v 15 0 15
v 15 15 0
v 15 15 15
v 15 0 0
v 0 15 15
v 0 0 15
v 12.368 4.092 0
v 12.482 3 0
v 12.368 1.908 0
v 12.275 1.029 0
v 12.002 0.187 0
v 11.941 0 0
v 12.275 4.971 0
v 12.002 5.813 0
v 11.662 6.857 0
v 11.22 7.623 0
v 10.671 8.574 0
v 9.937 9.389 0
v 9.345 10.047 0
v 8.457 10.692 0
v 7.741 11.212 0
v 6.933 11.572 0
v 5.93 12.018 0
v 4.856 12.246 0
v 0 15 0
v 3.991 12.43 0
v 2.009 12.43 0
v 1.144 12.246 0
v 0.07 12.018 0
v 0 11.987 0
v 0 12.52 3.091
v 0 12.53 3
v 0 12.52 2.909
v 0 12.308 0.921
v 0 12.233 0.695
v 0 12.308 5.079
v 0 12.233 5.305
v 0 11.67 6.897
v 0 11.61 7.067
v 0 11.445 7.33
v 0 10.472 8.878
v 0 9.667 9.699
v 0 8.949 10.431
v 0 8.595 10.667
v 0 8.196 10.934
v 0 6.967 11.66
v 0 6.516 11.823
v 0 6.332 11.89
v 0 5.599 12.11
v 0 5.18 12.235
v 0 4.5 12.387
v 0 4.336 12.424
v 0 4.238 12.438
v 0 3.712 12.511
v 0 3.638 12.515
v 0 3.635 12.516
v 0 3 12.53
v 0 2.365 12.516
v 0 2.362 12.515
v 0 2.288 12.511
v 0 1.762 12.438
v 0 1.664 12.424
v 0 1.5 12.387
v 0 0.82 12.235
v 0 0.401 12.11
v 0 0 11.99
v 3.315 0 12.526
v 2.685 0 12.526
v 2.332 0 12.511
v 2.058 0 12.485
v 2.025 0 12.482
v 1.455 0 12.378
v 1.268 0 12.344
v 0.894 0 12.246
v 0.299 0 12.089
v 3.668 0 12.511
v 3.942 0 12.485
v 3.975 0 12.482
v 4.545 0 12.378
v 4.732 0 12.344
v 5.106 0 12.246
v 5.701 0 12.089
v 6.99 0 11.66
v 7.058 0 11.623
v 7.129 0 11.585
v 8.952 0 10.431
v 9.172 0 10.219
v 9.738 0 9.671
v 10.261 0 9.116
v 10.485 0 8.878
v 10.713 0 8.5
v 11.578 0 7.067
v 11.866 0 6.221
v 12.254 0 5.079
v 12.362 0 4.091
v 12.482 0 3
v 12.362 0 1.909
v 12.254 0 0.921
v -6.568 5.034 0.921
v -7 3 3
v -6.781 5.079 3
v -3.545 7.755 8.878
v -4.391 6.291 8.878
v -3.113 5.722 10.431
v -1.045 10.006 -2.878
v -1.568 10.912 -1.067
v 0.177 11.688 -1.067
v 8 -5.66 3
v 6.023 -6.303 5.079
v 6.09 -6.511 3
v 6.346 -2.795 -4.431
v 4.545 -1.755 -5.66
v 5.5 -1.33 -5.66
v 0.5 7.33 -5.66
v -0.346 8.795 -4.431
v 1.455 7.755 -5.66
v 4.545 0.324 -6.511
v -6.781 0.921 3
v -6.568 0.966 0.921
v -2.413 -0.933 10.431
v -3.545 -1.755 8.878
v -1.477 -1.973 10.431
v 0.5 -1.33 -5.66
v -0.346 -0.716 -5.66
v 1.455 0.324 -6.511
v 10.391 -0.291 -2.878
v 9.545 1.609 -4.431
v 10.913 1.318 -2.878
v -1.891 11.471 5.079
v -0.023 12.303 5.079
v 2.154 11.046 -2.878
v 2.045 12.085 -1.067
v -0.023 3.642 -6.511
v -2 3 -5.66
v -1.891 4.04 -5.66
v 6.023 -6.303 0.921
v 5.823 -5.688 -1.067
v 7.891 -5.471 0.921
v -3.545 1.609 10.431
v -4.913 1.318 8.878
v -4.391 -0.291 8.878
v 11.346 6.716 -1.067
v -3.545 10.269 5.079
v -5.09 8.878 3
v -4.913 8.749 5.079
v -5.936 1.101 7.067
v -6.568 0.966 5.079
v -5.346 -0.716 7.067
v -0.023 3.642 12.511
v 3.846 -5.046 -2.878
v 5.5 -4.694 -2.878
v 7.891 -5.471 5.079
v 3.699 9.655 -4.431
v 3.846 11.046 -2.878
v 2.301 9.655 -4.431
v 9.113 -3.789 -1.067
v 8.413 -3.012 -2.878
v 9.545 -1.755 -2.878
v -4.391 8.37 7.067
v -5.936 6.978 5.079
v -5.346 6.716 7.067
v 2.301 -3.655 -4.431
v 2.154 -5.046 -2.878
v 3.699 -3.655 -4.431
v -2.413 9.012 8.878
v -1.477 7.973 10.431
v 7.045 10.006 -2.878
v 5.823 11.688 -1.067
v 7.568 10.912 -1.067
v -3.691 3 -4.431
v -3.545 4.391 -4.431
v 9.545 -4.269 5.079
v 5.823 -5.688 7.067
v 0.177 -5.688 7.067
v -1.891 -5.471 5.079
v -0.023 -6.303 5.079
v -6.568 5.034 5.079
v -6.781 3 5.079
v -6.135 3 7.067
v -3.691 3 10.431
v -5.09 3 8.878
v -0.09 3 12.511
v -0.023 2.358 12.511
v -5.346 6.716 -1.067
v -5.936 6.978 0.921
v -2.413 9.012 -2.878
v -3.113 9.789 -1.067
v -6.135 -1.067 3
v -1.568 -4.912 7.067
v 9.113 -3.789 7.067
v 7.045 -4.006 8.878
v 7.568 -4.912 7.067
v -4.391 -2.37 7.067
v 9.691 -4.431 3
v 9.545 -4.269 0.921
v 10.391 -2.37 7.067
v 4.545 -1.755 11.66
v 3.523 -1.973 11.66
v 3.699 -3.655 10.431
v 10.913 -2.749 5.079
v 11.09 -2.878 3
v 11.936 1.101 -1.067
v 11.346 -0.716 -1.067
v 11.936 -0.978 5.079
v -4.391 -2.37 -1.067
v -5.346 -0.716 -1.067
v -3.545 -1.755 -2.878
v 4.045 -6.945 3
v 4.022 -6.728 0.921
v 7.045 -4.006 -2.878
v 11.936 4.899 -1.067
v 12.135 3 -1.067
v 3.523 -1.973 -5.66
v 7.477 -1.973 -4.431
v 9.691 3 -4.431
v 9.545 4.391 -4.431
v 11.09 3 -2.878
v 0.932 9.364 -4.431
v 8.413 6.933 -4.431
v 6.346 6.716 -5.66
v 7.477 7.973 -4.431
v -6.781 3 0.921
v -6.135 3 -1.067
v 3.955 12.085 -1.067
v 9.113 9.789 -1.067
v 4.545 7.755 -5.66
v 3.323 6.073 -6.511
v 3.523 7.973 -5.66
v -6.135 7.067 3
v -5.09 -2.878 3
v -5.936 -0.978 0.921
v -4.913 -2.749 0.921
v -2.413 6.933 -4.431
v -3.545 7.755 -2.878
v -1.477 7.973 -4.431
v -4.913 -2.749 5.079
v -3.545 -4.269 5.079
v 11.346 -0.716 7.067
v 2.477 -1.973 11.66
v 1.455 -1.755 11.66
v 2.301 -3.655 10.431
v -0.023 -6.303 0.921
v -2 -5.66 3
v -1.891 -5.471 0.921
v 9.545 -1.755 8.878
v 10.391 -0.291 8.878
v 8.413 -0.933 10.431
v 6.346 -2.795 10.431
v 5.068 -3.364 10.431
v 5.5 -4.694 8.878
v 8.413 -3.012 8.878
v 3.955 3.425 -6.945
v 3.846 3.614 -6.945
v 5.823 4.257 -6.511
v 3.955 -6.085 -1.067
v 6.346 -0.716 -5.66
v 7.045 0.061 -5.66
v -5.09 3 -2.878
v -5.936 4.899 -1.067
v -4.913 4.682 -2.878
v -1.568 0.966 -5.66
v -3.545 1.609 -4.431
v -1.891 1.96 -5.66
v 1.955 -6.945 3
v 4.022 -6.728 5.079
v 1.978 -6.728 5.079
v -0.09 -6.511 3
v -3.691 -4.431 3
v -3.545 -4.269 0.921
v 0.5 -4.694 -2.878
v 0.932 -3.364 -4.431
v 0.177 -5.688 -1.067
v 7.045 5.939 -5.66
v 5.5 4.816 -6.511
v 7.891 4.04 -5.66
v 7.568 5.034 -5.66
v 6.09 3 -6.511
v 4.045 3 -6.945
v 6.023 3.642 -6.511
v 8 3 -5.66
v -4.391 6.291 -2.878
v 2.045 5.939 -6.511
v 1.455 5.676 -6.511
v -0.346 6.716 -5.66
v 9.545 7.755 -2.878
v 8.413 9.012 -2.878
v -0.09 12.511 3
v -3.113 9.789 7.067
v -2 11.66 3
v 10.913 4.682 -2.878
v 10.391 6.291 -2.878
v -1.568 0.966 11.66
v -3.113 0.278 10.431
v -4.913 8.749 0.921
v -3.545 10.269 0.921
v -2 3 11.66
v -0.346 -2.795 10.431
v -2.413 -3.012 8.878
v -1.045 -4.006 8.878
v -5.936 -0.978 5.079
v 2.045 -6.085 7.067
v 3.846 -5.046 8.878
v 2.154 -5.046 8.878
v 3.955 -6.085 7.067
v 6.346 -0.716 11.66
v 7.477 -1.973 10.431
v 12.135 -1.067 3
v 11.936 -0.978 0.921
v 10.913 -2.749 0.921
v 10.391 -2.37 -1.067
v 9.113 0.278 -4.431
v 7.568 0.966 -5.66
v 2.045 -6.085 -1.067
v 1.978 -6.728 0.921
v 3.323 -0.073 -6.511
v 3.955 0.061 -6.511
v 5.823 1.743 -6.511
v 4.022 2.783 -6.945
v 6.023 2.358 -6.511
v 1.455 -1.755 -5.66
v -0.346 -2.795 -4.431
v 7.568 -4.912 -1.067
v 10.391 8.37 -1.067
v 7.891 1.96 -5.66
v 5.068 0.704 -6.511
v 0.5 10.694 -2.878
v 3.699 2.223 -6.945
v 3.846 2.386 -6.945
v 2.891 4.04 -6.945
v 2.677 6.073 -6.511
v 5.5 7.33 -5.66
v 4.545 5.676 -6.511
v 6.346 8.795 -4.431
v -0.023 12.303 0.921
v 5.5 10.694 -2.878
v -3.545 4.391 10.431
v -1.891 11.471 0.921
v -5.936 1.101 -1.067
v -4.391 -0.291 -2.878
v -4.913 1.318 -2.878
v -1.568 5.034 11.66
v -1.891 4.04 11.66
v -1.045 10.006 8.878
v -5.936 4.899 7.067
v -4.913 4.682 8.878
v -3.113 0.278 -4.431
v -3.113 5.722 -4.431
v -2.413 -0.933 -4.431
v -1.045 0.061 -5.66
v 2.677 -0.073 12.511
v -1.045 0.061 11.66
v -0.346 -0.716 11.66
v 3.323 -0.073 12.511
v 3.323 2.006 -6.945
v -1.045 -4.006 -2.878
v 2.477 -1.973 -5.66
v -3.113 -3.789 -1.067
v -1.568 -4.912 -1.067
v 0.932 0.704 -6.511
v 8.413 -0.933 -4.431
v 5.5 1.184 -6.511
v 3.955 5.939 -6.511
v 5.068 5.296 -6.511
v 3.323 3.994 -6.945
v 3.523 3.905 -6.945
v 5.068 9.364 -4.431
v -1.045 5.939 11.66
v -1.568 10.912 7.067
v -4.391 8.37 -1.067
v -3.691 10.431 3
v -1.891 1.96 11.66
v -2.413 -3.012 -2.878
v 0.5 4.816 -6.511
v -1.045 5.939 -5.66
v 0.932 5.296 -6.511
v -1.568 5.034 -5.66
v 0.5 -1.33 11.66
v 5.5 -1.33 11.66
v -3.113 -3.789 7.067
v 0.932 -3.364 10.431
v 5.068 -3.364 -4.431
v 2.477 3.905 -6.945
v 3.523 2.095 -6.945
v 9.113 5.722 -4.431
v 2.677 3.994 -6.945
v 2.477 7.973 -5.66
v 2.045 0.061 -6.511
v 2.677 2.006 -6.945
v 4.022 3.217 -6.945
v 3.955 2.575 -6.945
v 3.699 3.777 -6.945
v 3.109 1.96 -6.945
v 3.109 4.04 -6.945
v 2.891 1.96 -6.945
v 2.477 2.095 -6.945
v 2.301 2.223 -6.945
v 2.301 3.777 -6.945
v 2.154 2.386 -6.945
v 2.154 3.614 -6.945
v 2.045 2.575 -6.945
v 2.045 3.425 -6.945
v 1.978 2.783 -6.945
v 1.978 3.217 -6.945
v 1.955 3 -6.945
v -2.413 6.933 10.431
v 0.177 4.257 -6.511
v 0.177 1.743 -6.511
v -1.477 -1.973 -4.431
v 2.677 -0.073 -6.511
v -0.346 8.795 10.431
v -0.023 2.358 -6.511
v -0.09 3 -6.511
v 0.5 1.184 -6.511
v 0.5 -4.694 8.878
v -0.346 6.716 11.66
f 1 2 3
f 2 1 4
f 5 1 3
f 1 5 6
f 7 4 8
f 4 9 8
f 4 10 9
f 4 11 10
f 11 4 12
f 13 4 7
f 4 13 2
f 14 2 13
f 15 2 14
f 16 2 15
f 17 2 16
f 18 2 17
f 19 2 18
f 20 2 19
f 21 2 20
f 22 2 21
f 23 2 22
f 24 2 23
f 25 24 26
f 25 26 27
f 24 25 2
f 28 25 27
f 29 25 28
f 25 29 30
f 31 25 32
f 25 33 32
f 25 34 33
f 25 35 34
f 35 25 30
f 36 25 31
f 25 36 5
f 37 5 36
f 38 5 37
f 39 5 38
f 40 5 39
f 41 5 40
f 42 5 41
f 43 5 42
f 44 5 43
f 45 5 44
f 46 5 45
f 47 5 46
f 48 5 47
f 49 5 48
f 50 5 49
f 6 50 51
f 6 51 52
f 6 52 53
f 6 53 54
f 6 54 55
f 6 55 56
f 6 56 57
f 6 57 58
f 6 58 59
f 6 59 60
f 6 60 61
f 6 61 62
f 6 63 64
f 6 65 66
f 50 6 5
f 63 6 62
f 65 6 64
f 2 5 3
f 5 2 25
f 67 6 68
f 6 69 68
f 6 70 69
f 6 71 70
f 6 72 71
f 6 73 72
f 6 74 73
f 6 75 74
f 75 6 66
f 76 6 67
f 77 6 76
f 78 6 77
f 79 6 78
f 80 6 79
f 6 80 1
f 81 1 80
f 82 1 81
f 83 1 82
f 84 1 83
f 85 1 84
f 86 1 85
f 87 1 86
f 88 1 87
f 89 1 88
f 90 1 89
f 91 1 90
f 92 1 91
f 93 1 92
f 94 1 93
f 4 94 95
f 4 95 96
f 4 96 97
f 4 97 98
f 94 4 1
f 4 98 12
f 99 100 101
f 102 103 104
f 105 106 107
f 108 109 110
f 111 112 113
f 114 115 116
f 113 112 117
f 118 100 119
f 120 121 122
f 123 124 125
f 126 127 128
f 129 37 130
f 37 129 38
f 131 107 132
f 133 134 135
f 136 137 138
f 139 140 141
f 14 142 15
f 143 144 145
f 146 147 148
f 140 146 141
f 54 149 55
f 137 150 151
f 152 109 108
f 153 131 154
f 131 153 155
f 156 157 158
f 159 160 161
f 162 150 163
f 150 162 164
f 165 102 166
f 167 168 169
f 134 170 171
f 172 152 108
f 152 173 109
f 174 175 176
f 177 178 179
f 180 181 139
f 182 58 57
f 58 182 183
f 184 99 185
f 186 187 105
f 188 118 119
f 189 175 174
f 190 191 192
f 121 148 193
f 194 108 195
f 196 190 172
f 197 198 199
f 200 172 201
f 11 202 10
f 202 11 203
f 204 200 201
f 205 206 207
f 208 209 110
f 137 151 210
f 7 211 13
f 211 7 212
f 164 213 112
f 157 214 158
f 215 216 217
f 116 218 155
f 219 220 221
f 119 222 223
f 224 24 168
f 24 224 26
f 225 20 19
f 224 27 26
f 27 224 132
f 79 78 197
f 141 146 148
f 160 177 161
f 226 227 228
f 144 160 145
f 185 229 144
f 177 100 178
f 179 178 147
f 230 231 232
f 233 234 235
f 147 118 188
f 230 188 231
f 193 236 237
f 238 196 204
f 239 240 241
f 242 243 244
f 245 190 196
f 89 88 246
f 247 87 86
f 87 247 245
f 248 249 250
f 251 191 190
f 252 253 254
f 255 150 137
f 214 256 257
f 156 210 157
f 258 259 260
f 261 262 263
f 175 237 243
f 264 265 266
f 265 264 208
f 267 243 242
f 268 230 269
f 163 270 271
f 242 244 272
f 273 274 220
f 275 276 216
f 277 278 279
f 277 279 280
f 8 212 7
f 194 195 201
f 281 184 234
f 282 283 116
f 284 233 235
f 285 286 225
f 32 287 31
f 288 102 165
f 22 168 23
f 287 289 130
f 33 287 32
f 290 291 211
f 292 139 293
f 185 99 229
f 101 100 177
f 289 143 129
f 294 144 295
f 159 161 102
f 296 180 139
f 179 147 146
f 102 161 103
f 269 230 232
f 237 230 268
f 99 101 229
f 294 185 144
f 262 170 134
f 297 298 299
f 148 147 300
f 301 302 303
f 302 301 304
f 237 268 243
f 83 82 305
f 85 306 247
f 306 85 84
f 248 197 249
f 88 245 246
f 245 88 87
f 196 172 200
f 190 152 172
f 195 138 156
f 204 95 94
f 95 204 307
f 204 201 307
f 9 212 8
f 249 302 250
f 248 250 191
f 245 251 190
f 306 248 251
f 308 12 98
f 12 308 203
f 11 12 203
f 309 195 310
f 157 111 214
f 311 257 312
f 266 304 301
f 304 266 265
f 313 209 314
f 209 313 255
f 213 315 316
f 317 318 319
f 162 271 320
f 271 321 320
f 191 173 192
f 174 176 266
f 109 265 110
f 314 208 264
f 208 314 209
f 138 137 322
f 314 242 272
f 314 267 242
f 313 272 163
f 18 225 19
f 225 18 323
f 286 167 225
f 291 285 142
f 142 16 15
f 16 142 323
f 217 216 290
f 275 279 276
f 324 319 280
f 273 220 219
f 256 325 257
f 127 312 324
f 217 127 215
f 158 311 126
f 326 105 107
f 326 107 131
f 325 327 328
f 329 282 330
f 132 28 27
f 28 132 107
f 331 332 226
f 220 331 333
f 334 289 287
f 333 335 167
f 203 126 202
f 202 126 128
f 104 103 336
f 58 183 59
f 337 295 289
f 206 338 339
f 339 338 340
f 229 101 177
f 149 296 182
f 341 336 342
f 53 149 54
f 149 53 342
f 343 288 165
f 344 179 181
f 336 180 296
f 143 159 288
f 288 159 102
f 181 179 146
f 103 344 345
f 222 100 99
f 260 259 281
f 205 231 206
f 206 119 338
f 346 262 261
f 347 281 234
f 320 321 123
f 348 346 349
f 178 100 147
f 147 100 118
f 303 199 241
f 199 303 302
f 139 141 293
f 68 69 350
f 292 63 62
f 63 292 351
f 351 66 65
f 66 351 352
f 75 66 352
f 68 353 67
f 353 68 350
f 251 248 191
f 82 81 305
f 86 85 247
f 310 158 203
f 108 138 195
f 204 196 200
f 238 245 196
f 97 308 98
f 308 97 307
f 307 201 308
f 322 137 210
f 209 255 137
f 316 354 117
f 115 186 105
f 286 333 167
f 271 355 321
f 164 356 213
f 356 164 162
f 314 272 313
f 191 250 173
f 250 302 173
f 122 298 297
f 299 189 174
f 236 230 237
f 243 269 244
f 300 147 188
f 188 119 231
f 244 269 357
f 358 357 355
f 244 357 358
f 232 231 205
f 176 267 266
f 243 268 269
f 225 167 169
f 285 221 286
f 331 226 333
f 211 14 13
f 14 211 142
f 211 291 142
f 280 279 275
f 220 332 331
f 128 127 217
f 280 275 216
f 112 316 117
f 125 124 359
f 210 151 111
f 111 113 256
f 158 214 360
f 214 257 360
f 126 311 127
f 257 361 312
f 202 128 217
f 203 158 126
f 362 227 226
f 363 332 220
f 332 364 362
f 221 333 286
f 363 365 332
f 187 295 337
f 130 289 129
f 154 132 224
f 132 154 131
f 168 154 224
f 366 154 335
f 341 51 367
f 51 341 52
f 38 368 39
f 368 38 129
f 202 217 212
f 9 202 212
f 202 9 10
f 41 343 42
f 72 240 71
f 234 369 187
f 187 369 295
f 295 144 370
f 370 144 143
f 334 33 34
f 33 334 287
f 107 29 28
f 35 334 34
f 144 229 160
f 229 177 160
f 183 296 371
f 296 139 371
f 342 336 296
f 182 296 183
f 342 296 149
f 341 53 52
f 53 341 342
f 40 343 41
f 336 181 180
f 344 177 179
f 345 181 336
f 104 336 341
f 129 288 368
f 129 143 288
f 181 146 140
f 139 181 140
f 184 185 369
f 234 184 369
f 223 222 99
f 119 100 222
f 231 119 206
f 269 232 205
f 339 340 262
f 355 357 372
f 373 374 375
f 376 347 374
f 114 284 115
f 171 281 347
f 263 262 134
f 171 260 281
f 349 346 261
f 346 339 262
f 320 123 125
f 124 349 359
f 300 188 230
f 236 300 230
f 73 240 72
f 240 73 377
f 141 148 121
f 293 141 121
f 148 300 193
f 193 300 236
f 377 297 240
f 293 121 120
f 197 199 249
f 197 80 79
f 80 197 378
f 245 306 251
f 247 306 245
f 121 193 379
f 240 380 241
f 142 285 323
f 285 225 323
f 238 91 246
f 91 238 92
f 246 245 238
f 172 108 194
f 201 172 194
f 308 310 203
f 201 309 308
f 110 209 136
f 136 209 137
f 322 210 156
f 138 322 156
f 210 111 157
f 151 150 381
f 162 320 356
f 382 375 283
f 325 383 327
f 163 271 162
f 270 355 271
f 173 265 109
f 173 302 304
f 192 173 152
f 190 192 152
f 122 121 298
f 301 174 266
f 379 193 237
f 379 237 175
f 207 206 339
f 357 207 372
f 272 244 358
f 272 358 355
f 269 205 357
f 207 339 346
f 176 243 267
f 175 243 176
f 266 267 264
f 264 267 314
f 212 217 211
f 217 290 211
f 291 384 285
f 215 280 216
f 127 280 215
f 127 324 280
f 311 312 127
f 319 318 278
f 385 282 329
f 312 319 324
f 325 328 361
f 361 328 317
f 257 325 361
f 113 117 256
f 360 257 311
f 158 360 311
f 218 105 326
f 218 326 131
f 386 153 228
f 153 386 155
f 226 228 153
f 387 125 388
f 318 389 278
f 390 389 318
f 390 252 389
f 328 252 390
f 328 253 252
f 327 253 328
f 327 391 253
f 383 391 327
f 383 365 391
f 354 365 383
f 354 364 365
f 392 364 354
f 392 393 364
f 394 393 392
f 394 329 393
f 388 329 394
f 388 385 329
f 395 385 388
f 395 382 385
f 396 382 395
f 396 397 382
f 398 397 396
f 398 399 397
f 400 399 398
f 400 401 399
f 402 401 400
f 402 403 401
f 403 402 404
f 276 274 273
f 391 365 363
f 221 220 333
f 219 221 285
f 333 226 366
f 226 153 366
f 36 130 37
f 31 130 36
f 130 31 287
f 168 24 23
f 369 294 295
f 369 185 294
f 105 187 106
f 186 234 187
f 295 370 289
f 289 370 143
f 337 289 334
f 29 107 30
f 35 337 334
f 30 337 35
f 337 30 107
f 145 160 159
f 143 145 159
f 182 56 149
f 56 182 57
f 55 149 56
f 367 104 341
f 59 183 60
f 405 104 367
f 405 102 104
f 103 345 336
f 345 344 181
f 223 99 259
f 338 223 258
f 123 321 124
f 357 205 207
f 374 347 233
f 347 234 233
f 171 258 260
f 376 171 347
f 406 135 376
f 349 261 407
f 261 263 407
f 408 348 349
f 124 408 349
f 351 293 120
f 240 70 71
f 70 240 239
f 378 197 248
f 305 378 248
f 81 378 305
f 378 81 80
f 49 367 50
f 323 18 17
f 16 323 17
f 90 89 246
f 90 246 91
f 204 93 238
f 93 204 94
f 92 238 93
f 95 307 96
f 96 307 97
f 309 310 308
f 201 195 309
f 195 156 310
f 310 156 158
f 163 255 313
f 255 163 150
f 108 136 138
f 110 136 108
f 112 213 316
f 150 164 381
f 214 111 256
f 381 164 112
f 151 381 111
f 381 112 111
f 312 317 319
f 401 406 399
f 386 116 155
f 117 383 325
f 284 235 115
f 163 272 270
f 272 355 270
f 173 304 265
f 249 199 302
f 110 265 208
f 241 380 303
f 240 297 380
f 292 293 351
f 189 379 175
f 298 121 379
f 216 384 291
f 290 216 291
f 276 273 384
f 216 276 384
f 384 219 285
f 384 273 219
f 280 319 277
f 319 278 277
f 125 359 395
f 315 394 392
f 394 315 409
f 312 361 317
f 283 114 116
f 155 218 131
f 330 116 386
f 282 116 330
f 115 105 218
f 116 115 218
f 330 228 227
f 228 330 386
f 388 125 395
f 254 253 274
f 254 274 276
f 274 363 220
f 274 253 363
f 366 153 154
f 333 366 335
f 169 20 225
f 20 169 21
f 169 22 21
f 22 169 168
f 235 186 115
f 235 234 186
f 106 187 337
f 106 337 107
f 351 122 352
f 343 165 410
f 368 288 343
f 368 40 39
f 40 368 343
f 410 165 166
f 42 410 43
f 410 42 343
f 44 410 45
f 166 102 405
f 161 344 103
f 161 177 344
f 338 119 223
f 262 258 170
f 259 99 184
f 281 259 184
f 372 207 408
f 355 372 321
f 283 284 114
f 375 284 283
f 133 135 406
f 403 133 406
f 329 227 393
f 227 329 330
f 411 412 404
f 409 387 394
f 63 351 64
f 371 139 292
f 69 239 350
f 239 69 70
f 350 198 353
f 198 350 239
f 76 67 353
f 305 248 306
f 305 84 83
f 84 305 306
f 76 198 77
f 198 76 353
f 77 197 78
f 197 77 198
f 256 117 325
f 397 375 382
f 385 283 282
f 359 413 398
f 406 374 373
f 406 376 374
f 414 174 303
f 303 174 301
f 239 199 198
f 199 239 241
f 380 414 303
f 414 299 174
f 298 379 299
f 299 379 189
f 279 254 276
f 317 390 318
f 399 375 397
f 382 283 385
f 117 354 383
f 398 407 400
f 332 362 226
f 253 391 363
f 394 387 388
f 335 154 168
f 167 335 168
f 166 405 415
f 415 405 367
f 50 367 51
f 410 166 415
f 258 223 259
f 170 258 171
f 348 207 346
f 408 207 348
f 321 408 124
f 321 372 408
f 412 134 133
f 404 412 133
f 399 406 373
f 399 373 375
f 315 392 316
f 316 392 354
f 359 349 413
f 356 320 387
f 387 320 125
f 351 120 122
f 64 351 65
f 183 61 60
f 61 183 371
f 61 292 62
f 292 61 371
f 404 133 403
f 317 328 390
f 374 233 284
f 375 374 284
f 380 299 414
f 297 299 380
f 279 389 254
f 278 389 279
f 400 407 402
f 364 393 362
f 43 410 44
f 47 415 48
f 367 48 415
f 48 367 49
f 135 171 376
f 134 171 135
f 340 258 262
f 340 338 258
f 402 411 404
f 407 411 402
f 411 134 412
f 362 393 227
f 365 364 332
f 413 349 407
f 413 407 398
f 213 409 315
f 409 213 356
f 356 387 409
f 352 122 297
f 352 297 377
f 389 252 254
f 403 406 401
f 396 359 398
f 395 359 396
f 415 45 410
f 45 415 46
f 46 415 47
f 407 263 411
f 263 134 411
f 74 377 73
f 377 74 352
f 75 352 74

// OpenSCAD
union() {
	cube(15);
	translate([3, 3, 3]) {
		sphere(r=10);
	}
}
